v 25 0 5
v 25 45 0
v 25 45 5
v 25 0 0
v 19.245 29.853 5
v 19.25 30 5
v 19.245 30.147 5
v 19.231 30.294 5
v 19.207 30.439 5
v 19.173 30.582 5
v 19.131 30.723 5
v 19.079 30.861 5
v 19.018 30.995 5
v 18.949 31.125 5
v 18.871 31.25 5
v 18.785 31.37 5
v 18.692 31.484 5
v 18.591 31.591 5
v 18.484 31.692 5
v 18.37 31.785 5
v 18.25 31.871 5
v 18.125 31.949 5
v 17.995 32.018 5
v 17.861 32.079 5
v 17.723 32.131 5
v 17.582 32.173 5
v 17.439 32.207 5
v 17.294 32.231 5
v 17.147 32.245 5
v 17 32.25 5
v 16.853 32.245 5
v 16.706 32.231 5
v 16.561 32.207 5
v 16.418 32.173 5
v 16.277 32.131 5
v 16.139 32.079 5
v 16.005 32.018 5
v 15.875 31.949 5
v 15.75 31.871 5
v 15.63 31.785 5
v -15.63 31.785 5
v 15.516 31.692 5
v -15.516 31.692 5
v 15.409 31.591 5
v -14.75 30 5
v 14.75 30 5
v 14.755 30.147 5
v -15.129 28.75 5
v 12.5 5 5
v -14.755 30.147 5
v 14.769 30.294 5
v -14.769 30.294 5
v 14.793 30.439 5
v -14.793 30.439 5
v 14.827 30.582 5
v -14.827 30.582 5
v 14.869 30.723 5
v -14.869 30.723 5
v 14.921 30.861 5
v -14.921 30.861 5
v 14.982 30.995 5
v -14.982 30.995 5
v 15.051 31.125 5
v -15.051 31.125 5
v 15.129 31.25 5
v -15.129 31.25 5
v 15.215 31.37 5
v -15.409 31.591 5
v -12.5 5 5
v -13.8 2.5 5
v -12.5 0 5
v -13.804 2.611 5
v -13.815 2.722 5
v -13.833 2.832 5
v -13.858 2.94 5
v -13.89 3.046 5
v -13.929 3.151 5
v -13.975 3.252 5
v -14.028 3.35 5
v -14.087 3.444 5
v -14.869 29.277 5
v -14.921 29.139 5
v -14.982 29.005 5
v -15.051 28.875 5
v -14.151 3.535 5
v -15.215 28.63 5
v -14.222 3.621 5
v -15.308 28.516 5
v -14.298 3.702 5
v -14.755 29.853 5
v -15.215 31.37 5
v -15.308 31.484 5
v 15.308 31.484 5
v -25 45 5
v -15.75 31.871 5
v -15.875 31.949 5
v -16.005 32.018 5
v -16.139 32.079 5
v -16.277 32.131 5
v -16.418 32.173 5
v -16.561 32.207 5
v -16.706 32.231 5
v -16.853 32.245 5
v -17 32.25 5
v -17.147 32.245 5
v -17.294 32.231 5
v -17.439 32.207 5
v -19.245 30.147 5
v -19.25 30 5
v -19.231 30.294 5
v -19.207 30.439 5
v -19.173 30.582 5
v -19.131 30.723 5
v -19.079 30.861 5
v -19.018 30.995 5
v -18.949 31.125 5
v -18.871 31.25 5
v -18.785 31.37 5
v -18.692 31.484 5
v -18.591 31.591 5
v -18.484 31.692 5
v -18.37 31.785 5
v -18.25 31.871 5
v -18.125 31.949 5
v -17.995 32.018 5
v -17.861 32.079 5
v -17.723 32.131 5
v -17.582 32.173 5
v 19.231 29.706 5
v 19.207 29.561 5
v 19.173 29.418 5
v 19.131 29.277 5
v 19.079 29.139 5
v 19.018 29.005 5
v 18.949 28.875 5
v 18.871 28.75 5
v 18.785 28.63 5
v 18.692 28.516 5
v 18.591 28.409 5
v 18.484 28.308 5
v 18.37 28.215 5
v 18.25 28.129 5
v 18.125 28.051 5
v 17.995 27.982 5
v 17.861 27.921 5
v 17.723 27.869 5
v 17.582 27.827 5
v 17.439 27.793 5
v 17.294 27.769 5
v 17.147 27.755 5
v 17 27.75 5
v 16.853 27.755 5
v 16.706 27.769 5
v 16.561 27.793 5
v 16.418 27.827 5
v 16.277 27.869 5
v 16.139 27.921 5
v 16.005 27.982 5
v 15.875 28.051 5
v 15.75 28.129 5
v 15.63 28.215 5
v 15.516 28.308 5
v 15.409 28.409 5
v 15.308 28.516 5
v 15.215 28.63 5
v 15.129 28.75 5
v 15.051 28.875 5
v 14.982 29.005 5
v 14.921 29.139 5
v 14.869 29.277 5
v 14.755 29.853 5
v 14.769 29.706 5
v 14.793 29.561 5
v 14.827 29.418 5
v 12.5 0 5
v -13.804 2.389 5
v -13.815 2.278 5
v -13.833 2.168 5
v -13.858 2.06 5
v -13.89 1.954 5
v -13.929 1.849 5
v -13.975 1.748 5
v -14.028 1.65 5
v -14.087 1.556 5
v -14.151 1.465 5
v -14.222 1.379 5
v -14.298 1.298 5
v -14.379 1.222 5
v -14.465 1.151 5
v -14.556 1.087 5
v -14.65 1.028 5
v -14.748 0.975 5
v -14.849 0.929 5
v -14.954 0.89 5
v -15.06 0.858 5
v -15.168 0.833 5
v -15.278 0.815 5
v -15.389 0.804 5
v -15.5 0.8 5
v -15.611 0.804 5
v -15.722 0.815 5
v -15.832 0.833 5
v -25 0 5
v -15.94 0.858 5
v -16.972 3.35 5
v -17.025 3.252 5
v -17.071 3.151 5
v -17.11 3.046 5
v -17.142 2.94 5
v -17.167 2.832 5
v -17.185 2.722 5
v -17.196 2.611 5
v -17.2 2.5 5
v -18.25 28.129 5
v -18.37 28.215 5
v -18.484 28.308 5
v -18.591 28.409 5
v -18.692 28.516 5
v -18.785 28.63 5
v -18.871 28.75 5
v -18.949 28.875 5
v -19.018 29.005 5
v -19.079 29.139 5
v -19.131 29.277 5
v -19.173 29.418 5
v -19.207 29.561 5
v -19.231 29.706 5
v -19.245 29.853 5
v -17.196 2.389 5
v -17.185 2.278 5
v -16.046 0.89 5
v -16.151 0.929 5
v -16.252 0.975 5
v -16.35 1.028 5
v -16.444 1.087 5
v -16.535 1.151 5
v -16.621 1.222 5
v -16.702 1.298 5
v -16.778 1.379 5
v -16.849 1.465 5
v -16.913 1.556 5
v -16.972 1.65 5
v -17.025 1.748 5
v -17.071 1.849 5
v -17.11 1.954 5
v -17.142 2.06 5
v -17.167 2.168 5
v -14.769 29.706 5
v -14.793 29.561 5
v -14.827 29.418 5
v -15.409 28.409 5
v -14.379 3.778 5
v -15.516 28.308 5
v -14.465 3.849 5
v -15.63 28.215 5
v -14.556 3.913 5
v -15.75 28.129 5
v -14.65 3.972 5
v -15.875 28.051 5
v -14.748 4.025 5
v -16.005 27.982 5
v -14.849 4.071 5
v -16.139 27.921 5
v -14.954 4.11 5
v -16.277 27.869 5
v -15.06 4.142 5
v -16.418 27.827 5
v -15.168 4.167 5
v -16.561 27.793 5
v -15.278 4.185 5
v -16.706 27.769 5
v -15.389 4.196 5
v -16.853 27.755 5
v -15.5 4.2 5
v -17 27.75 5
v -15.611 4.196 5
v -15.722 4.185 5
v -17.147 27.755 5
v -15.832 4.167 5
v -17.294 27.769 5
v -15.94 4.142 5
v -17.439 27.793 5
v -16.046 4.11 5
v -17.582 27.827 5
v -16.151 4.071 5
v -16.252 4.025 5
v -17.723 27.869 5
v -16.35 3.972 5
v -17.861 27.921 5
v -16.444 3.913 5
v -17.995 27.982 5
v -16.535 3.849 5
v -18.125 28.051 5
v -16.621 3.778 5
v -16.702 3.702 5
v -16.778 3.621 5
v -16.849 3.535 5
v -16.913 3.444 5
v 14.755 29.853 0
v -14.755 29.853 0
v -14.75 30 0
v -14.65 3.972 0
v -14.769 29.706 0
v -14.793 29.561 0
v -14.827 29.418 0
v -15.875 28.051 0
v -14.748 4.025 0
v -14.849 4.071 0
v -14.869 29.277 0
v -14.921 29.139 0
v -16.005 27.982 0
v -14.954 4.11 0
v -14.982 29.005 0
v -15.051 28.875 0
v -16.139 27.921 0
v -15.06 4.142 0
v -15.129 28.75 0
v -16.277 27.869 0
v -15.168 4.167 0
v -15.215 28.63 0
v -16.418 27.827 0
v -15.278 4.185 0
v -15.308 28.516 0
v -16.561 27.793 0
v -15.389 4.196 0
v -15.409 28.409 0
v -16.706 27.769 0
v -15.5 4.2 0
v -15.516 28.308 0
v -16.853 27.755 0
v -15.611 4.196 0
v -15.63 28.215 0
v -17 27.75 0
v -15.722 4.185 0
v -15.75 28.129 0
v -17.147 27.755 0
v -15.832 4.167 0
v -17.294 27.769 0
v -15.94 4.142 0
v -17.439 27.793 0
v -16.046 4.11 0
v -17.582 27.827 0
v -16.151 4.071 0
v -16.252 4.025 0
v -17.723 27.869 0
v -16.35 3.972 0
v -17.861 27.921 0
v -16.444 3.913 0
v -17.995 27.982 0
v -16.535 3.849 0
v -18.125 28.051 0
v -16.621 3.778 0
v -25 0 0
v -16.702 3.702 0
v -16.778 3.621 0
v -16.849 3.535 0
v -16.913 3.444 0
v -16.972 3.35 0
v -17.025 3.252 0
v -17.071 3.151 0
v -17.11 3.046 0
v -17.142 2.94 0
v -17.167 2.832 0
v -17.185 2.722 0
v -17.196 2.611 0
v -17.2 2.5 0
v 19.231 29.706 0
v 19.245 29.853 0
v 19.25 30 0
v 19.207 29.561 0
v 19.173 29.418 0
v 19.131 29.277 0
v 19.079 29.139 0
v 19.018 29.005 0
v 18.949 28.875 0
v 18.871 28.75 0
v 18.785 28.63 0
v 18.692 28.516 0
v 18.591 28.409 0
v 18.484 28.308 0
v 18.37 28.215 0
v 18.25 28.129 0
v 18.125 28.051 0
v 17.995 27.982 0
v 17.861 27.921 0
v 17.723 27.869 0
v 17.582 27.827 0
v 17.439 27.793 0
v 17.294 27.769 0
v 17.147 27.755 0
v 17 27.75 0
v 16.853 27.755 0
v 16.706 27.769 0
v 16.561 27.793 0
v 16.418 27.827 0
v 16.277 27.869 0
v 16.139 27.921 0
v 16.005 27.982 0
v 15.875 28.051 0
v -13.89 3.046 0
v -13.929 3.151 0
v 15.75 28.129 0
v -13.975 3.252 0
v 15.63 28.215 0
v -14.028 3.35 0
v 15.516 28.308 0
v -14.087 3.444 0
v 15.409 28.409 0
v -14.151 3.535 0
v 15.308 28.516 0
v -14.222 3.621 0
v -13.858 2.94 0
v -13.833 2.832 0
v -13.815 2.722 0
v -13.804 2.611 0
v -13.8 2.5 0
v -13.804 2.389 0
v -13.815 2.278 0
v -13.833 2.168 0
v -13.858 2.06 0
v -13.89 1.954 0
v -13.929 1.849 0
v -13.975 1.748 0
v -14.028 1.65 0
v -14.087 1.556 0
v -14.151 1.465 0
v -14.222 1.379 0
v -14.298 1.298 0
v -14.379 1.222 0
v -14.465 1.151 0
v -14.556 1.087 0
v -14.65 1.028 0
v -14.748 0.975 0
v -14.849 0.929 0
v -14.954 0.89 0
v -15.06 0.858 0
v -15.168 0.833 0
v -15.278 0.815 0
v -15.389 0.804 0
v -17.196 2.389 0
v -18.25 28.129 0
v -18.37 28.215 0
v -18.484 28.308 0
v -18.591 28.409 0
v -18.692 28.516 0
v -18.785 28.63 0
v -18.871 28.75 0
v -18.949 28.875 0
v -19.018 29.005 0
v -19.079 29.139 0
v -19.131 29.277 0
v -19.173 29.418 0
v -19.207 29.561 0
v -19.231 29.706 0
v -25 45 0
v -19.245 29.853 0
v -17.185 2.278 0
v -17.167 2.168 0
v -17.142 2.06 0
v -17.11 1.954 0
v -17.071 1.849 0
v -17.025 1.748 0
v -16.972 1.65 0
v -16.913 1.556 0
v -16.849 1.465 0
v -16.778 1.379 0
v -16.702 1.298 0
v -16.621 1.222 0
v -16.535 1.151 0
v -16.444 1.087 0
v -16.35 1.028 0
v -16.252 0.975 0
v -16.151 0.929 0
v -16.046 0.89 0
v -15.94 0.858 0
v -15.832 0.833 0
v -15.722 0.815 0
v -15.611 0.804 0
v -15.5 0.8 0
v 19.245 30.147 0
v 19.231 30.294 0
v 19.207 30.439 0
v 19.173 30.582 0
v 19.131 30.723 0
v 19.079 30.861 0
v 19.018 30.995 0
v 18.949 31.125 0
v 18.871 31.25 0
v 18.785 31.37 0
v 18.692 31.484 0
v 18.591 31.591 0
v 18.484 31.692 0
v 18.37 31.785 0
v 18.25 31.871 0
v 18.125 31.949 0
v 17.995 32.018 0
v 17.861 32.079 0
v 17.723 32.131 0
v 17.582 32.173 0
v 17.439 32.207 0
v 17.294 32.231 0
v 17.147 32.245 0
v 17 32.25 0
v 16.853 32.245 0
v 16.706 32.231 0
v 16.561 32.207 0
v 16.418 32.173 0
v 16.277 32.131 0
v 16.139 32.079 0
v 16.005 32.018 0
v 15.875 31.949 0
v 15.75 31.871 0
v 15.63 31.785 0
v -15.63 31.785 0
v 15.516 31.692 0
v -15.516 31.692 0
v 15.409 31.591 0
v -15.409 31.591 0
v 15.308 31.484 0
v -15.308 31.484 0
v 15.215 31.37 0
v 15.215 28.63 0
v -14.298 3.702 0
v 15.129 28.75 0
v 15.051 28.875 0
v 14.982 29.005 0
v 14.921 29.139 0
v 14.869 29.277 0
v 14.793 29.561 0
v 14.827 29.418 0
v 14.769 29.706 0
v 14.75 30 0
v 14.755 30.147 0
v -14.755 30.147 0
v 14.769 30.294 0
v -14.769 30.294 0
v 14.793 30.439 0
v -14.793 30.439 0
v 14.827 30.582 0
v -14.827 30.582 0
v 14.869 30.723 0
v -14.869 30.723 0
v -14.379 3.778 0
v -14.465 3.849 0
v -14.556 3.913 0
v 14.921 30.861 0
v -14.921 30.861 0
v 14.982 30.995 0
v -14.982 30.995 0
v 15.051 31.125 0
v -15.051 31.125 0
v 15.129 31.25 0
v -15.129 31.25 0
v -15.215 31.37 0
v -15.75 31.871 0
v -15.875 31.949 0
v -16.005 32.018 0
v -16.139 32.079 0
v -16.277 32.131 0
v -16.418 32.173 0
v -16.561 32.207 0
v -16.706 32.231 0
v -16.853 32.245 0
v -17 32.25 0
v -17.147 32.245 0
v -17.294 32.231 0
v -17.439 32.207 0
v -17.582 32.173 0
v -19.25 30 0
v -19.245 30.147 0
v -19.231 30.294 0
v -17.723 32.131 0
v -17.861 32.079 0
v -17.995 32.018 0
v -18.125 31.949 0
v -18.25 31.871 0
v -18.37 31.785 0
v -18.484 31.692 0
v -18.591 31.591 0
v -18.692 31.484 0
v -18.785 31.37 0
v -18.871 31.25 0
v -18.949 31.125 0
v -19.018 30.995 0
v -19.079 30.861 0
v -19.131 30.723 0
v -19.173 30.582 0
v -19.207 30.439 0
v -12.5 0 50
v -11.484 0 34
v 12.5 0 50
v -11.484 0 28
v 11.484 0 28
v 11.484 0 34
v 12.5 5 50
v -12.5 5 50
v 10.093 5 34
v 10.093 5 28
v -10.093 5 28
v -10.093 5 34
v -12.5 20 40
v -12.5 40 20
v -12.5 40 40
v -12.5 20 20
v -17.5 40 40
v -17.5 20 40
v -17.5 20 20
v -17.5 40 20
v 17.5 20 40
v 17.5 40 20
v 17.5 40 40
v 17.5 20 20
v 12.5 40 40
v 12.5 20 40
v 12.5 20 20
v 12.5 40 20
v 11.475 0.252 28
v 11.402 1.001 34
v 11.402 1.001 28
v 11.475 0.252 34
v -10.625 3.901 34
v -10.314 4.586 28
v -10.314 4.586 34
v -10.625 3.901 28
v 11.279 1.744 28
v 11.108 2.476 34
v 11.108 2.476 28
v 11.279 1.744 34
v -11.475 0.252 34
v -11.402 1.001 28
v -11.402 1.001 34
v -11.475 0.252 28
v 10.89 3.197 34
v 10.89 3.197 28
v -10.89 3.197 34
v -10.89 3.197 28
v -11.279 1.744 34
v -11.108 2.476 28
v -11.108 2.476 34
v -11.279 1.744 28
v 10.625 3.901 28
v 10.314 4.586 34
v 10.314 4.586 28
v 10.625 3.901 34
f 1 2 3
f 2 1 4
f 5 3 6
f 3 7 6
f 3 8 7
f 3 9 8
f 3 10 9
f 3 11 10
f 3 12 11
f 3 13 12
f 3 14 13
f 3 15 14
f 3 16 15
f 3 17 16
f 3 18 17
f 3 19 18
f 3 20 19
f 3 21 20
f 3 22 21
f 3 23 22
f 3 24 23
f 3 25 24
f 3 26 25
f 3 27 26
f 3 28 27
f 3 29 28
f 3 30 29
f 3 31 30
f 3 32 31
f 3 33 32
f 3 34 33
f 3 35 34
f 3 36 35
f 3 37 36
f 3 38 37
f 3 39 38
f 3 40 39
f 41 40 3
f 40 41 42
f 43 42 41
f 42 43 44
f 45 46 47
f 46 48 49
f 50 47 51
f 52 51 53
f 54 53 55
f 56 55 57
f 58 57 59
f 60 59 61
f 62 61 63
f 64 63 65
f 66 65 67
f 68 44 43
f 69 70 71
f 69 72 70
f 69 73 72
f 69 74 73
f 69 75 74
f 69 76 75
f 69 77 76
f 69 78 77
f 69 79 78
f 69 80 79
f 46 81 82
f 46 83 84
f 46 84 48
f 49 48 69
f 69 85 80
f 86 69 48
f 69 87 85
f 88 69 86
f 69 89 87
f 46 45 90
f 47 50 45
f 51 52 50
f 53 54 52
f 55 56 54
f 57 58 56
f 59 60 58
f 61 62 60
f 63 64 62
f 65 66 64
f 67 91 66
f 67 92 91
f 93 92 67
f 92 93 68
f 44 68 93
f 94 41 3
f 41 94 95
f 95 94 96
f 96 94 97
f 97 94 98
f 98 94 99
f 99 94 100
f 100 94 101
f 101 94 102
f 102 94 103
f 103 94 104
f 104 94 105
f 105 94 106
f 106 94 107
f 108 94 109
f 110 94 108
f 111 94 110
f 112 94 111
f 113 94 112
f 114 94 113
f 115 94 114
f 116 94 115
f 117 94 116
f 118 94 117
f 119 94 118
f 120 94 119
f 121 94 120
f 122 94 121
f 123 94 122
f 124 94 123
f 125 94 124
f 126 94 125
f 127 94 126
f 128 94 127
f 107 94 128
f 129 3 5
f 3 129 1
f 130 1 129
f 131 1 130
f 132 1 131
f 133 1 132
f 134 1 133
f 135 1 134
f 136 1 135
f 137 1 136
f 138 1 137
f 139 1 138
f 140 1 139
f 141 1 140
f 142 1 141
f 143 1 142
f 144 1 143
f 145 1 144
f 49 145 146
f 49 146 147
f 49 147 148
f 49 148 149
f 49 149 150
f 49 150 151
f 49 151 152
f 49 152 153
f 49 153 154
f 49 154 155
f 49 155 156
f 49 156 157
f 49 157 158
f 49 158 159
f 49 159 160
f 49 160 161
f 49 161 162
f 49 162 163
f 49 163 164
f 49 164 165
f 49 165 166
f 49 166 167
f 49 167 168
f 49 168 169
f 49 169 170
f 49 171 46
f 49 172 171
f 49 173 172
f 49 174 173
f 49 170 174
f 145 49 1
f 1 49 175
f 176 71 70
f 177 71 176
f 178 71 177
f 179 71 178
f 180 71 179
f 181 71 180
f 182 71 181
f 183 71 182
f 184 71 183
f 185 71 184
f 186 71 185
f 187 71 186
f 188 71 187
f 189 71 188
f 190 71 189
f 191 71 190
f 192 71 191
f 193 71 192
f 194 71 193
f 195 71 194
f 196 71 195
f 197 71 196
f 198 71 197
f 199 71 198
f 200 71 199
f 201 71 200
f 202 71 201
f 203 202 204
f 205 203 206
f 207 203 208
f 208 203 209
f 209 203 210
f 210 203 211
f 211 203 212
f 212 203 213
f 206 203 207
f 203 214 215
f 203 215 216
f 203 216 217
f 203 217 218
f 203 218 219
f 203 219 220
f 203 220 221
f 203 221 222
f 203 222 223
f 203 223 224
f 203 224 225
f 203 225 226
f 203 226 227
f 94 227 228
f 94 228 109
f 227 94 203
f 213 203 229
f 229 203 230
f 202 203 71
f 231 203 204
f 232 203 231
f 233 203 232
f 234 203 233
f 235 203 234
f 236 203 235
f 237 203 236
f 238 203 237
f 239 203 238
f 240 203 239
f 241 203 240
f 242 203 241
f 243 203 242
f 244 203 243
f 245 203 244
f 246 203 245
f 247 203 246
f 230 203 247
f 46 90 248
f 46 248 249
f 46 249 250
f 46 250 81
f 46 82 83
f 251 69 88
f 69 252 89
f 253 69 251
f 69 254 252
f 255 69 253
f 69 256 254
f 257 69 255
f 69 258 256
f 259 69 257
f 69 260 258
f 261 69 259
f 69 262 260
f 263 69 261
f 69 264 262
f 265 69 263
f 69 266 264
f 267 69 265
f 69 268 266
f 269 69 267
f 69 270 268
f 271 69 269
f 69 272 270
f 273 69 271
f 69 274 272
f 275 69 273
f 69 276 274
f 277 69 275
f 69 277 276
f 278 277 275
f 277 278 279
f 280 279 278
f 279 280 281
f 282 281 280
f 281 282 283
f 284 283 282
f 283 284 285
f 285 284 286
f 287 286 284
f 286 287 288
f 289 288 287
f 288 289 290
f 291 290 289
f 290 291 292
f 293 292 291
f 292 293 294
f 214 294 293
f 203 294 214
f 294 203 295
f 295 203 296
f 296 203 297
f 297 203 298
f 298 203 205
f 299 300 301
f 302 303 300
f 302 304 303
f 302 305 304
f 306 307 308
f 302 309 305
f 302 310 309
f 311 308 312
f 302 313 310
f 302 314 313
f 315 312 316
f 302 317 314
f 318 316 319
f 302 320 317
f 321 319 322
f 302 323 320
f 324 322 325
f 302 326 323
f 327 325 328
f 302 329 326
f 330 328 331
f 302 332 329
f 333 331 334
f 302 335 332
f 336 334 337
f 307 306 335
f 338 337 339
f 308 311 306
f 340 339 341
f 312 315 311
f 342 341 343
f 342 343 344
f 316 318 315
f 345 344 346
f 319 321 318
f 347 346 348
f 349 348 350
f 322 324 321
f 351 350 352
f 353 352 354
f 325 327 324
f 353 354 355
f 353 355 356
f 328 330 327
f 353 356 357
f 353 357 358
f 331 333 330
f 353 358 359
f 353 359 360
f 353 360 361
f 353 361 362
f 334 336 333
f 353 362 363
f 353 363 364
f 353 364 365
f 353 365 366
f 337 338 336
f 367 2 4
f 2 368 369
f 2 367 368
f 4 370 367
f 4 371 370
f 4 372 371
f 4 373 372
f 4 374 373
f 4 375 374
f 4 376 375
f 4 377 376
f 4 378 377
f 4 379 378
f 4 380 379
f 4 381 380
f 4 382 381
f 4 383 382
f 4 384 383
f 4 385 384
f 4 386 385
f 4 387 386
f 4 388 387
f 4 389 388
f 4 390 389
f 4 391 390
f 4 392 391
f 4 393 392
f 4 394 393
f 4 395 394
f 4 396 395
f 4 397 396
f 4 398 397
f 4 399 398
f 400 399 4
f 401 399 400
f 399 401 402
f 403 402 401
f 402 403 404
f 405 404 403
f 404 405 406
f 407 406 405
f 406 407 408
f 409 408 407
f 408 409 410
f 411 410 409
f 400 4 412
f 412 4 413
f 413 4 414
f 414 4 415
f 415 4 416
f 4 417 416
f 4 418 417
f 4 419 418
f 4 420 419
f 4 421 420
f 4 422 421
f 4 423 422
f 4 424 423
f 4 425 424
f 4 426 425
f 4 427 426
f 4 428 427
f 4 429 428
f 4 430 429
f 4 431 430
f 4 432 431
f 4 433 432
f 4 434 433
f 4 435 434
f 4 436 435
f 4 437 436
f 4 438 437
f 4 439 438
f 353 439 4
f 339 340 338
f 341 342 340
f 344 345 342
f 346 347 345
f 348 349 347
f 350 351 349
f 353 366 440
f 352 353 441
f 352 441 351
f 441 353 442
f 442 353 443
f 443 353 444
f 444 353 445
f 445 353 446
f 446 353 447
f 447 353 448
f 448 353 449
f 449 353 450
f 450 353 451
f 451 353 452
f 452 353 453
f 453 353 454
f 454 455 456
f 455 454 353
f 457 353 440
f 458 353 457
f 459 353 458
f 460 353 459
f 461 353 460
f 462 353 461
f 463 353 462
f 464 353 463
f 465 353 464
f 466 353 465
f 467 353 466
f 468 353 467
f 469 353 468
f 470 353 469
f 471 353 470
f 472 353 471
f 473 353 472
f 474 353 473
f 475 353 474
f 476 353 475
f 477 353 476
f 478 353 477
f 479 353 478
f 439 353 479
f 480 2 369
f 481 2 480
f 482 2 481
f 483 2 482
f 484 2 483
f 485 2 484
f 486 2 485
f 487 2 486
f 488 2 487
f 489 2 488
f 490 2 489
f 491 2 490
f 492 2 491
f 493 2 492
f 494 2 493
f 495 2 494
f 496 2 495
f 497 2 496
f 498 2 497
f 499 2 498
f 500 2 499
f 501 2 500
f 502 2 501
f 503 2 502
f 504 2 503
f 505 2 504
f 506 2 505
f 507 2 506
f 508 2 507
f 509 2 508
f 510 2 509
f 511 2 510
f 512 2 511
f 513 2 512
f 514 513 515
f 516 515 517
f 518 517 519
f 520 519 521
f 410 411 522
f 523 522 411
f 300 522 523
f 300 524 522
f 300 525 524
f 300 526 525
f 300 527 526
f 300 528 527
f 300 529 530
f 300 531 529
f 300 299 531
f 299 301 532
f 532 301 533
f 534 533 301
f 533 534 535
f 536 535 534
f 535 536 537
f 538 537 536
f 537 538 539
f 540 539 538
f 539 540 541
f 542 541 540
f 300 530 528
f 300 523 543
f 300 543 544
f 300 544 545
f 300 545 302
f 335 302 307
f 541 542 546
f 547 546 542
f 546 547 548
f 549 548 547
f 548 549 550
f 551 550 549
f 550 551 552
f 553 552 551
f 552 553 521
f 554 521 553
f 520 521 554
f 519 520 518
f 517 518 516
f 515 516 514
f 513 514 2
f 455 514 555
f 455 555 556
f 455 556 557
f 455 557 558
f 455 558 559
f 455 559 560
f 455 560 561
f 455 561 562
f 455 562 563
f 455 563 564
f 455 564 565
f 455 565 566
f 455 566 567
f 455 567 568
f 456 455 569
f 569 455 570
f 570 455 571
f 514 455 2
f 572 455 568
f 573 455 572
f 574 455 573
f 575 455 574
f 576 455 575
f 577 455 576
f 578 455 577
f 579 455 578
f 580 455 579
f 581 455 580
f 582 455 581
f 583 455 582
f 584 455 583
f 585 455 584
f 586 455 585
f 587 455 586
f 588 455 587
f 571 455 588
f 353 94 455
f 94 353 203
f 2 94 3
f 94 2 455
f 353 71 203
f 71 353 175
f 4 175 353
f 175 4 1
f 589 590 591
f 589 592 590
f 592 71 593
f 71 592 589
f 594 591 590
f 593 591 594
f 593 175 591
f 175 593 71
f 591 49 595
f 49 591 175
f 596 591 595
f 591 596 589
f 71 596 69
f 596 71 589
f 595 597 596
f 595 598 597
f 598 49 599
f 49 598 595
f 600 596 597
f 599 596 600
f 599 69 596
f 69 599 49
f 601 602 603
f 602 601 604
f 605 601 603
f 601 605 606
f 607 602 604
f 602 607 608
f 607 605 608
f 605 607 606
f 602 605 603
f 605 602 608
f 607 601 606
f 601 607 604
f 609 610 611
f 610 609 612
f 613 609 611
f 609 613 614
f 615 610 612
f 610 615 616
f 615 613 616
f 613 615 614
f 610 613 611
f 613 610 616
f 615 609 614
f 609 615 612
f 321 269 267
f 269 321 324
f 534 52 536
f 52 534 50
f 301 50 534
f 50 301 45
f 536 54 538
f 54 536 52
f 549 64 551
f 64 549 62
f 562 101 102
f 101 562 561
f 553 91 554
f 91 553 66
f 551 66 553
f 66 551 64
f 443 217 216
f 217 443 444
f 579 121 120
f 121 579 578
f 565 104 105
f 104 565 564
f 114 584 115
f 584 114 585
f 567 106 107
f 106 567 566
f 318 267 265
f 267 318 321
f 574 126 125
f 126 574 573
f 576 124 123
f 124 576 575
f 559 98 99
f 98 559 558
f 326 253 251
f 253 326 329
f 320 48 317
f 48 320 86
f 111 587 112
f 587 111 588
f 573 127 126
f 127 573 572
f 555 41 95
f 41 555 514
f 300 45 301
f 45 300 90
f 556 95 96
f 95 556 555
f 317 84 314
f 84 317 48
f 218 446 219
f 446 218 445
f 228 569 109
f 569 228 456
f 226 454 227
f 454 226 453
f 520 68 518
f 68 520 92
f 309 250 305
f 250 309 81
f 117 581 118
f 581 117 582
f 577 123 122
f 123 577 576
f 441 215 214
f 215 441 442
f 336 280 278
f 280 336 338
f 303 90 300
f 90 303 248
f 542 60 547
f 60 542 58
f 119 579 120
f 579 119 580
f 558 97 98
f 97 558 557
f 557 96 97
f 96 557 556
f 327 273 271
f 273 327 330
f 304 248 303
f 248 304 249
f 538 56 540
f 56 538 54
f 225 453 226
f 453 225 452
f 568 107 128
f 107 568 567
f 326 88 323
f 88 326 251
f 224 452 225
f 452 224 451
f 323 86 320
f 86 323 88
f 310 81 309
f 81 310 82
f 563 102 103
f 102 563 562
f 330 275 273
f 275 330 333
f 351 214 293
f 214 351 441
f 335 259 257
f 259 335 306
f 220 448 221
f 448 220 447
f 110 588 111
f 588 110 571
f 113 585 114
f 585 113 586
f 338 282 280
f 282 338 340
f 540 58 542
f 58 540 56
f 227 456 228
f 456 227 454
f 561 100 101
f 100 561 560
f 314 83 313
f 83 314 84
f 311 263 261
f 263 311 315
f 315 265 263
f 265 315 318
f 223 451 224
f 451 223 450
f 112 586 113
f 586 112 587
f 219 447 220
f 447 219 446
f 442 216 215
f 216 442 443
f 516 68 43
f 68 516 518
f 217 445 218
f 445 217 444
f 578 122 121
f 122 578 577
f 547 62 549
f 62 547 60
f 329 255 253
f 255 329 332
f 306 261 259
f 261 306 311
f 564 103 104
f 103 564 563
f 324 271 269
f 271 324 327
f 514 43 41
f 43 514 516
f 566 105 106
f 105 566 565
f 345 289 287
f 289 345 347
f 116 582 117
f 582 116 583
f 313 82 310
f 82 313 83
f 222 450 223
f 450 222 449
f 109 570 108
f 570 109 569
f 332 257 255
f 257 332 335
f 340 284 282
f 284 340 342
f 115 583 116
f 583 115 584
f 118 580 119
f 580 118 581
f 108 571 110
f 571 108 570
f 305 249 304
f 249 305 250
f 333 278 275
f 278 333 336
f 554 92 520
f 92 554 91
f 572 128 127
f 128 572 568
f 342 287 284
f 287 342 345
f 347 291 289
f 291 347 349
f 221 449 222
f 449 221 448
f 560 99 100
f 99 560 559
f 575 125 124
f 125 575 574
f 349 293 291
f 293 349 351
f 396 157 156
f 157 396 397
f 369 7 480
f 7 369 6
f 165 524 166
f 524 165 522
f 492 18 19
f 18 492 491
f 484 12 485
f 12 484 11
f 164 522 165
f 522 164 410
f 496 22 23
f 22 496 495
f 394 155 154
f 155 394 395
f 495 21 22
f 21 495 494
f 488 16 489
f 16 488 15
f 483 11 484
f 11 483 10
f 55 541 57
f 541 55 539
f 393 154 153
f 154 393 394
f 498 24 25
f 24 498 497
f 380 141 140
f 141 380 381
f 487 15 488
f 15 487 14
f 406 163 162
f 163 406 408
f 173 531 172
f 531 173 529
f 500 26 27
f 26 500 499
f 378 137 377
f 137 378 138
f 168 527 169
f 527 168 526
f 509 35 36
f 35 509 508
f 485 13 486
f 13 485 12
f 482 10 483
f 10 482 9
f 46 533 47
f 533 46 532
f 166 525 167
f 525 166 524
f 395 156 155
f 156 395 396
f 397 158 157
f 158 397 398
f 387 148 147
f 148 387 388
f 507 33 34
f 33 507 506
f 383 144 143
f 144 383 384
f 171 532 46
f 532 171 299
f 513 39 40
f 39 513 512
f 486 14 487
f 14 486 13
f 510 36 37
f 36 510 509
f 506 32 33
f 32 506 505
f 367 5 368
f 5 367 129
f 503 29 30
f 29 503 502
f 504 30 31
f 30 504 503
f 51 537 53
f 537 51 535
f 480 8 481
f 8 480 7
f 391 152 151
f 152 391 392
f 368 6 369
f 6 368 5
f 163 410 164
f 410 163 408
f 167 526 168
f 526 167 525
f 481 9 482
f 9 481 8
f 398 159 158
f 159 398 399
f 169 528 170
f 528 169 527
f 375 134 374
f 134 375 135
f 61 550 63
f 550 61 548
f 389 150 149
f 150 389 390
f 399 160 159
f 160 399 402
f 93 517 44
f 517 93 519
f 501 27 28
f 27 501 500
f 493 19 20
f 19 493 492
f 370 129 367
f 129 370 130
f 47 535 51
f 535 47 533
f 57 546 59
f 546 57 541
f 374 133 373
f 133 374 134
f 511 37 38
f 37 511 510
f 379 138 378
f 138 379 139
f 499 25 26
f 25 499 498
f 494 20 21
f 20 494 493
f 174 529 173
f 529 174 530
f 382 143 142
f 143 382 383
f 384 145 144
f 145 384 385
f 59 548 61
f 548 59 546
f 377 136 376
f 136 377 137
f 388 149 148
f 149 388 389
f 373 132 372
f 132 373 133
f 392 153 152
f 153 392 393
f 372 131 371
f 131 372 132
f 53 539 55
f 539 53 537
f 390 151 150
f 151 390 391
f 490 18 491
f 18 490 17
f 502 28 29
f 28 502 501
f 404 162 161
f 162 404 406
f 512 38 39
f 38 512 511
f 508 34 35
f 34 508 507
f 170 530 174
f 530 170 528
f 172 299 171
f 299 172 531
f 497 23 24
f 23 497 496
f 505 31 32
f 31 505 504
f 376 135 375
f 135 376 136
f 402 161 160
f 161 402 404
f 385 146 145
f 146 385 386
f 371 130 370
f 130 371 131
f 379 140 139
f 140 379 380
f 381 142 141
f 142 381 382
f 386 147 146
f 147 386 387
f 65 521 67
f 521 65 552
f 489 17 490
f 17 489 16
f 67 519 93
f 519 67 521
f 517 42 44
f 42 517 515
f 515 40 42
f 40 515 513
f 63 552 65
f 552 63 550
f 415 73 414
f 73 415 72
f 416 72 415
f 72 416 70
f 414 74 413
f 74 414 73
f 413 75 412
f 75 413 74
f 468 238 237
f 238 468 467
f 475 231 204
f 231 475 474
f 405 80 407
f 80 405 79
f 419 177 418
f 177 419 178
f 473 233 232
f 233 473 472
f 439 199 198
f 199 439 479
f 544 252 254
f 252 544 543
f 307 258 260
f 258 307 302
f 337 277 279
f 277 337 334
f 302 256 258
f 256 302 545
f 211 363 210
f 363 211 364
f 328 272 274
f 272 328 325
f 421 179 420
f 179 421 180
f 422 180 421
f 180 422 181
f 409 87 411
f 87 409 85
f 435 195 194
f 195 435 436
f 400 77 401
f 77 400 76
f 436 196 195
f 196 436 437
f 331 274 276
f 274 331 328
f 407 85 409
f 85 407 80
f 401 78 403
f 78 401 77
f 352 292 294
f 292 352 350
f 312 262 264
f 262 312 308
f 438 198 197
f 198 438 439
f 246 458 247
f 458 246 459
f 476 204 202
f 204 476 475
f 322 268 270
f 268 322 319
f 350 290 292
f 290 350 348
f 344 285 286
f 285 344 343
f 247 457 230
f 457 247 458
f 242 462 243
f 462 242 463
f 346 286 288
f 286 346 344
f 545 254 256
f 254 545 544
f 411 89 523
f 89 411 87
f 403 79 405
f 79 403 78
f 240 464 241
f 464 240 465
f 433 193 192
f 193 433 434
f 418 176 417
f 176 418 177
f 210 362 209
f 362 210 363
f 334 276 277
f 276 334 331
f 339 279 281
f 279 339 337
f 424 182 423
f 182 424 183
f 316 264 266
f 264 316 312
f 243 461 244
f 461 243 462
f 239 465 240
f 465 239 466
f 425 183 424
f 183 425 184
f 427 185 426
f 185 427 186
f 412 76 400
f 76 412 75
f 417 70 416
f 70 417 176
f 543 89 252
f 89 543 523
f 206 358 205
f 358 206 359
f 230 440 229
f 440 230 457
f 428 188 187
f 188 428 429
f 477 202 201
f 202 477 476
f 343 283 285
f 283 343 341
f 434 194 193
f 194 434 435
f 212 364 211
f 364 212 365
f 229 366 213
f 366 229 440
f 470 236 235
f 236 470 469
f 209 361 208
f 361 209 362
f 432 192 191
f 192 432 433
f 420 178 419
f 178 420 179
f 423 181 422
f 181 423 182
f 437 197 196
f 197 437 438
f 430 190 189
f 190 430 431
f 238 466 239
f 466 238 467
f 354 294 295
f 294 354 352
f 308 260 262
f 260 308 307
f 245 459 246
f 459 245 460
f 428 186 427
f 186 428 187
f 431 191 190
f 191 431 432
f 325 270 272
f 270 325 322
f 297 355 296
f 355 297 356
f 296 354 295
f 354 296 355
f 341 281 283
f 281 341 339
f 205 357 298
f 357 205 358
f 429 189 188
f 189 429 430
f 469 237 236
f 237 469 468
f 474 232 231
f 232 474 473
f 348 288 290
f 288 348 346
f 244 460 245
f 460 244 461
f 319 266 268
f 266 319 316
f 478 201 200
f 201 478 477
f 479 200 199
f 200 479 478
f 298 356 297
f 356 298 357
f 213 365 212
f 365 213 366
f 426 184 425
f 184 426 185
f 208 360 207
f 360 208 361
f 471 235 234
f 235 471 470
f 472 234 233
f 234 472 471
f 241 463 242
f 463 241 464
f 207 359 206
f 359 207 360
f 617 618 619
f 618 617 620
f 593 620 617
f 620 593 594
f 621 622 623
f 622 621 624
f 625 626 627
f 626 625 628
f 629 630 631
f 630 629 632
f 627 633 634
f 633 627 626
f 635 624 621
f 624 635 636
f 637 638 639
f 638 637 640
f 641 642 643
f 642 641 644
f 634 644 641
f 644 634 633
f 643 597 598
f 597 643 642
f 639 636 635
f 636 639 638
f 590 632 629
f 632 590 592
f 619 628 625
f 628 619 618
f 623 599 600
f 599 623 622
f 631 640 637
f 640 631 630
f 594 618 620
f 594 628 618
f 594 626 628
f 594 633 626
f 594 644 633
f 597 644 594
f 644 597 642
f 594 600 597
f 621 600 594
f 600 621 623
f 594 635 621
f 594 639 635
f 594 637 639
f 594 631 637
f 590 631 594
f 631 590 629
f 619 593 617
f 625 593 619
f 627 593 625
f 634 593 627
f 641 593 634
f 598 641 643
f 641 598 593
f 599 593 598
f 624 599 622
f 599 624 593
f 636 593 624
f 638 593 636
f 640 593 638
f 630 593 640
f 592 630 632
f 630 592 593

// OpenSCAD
// L-shaped mounting bracket for NEMA 17 stepper motor (e.g. syringe pump)
// Print orientation: base plate on bed, vertical plate builds up in +Z

// ---------- Parameters ----------
base_x      = 50;    // base plate length in X (-25 to +25)
base_y      = 45;    // base plate width in Y (0 to 45)
base_t      = 5;     // base plate thickness in Z

hole_m4_x   = -17;   // M4 hole centre X (left)
hole_m4_y   = 30;    // M4 hole centre Y
hole_m4_x2  = 17;    // M4 hole centre X (right)

motor_x     = 25;    // motor plate length in X (-25 to +25)
motor_y     = 5;     // motor plate width in Y (0 to 5)
motor_z     = 50;    // motor plate height in Z

boss_d      = 23;    // motor centring boss hole diameter
boss_x      = 0;     // boss hole centre X
boss_z      = 28;    // boss hole centre Z

screw_d     = 3.4;   // M3 screw hole diameter
screw_pitch = 31;    // square pattern side length
screw_n     = 4;     // number of screw holes

gusset_t    = 5;     // gusset thickness in X
gusset_y    = 20;    // gusset leg along +Y
gusset_z    = 20;    // gusset leg along +Z

eps         = 0.5;   // cutter overshoot past faces
$fn         = 96;    // curve resolution

// ---------- Model ----------
difference() {
    union() {
        // Base plate
        translate([-base_x/2, 0, 0])
            cube([base_x, base_y, base_t]);

        // Vertical motor plate
        translate([-motor_x/2, 0, 0])
            cube([motor_x, motor_y, motor_z]);

        // Left gusset (right-angle corner at y=5, z=5)
        translate([-motor_x/2 - gusset_t, gusset_y, gusset_z])
            cube([gusset_t, gusset_y, gusset_z]);

        // Right gusset (right-angle corner at y=5, z=5)
        translate([motor_x/2, gusset_y, gusset_z])
            cube([gusset_t, gusset_y, gusset_z]);
    }

    // Base plate through-holes (M4)
    for (hx = [hole_m4_x, hole_m4_x2])
        translate([hx, hole_m4_y, -eps])
            cylinder(d = 4.5, h = base_t + 2*eps);

    // Motor plate boss hole (along Y)
    translate([boss_x, -eps, boss_z])
        cylinder(d = boss_d, h = motor_y + 2*eps);

    // M3 screw holes on square pattern, centred on boss hole
    for (i = [0 : screw_n - 1]) {
        a = screw_pitch / 2;
        x = (i % 2 == 0) ? -a : a;
        z = (i / 2 == 0) ? -a : a;
        translate([x, motor_y/2, z])
            cylinder(d = screw_d, h = motor_z + 2*eps);
    }
}
